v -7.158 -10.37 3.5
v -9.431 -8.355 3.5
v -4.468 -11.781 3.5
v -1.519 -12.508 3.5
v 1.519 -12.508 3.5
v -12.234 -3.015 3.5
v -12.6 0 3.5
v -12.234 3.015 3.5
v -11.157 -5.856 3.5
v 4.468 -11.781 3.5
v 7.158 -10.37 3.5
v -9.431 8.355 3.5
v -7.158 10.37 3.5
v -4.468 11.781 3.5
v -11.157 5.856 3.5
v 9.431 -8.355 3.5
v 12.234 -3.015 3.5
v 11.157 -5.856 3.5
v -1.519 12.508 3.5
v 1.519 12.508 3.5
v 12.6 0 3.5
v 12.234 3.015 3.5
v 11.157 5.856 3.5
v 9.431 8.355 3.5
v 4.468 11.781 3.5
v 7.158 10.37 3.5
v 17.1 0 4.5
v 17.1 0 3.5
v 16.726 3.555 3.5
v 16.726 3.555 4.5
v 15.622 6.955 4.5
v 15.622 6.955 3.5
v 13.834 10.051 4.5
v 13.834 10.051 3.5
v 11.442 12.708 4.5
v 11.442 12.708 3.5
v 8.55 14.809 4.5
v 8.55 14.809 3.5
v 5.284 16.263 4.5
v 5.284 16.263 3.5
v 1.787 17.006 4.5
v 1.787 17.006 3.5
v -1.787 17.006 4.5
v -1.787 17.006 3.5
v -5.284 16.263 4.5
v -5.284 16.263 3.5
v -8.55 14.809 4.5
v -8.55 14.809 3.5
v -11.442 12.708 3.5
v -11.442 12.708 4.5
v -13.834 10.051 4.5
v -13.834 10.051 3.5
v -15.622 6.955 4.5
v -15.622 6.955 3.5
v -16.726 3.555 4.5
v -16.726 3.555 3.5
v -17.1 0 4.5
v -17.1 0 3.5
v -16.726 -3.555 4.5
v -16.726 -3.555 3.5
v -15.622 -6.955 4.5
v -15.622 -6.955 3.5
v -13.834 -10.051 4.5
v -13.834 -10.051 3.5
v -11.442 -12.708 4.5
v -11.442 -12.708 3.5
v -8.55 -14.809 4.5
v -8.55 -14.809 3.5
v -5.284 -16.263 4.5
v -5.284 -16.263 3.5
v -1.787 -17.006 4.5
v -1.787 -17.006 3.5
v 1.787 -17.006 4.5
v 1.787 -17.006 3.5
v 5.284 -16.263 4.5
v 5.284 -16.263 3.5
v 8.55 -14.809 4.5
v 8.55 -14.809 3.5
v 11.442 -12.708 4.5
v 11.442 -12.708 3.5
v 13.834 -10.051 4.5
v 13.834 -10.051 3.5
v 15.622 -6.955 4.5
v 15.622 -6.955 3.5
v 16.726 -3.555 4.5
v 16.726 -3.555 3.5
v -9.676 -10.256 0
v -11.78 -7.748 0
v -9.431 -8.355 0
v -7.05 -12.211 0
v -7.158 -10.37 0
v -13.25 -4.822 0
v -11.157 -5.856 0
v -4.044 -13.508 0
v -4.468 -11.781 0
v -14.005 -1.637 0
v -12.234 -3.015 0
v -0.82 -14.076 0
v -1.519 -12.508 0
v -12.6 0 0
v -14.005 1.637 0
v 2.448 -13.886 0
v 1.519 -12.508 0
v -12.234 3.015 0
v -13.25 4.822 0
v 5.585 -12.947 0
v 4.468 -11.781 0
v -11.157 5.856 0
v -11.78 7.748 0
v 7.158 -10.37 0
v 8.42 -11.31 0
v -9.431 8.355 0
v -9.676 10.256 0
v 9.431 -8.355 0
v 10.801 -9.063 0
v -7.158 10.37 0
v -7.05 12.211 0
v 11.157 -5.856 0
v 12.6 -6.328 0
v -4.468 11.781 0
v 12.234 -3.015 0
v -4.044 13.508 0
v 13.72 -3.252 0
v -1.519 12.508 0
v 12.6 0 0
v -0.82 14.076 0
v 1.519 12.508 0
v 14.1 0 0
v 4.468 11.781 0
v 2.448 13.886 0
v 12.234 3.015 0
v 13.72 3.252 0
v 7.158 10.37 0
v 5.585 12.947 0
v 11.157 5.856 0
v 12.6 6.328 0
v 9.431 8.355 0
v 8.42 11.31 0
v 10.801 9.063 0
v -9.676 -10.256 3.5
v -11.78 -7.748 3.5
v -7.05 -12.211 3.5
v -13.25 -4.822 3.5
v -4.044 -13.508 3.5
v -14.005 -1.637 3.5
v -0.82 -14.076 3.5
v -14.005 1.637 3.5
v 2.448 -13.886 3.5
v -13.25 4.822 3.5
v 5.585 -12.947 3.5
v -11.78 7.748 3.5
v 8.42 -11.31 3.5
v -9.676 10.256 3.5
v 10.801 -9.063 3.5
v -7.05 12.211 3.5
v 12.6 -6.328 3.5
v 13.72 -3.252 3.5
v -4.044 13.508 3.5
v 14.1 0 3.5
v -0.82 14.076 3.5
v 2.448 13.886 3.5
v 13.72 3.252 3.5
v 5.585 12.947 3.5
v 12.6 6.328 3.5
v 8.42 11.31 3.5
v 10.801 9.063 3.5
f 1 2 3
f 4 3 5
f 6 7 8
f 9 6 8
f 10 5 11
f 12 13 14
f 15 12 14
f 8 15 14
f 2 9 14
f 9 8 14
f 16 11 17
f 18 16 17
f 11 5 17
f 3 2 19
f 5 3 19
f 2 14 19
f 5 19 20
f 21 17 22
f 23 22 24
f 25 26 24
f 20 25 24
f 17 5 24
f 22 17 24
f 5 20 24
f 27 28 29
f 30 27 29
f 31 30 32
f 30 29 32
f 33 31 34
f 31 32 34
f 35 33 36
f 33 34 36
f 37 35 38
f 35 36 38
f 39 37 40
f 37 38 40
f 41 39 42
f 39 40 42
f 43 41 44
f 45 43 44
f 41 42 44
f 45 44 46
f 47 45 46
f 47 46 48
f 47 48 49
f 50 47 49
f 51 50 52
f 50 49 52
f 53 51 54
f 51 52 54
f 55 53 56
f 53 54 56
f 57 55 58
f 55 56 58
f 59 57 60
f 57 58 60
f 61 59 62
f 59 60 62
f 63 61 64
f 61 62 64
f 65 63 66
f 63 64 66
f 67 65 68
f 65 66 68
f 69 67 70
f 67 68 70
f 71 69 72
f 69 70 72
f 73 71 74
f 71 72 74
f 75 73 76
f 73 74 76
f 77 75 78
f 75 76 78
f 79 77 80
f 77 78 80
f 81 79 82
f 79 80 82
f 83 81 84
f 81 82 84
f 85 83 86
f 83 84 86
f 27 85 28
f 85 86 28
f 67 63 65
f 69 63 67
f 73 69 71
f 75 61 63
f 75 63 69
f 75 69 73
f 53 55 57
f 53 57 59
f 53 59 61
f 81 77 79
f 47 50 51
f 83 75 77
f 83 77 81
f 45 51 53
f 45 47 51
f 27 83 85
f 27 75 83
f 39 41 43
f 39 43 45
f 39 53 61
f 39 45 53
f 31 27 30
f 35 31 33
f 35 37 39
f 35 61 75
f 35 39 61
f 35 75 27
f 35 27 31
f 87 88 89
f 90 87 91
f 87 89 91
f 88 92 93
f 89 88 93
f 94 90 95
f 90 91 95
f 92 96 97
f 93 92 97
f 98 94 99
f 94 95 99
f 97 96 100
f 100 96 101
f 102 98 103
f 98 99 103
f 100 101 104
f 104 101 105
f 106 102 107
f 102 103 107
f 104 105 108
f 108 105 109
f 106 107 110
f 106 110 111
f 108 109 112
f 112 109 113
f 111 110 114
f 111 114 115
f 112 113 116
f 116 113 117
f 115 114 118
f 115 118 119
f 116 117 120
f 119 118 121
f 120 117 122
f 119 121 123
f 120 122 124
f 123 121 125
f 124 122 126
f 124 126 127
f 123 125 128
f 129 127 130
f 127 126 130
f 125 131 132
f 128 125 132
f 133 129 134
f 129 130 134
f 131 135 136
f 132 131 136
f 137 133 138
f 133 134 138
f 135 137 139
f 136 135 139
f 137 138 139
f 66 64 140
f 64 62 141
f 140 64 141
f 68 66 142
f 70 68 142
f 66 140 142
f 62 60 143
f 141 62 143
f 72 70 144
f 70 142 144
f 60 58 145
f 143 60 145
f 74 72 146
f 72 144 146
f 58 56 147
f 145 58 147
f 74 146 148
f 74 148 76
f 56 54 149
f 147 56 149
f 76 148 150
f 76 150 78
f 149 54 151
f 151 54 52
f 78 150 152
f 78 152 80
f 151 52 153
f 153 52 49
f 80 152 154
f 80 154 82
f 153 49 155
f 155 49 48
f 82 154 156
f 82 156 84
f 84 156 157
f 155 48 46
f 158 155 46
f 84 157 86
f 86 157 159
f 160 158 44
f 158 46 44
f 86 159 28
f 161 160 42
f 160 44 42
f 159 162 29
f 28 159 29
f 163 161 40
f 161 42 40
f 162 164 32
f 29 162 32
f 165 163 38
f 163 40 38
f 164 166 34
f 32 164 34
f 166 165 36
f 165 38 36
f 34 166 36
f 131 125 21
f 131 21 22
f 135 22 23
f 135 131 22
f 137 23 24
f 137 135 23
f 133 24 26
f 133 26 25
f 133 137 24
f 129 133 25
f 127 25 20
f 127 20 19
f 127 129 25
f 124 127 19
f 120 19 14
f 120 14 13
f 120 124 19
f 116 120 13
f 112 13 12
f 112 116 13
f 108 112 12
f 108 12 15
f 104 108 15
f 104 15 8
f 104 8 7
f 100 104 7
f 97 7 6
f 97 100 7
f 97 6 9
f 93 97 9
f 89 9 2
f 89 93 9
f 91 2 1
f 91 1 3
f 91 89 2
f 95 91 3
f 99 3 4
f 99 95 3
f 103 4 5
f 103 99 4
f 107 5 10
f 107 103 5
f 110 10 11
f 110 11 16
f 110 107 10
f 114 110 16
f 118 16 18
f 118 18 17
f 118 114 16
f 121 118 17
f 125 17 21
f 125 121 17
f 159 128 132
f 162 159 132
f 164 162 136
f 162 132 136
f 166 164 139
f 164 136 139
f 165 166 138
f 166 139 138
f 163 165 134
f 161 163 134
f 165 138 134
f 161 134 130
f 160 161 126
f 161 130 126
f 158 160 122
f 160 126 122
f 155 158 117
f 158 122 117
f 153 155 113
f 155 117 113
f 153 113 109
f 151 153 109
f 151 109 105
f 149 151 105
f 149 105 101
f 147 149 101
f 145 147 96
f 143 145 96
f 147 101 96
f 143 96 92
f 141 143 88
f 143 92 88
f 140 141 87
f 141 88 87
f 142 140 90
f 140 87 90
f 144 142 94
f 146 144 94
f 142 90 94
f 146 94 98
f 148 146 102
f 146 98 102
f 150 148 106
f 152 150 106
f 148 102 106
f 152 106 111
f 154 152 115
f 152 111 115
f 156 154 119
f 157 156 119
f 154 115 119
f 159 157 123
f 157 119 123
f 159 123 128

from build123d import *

# Parameters (mm, degrees)
SKETCH1_R           = 14.1
SKETCH1_R_2         = 12.6
BOSS_EXTRUDE1_DEPTH = 3.5
SKETCH2_R           = 17.1
SKETCH2_R_2         = 14.1
SKETCH2_R_3         = 12.6
BOSS_EXTRUDE2_DEPTH = 1


with BuildPart() as part:
    # Sketch1 → Boss-Extrude1 (new body)
    with BuildSketch(Plane.XY):
        Circle(SKETCH1_R)
        Circle(SKETCH1_R_2, mode=Mode.SUBTRACT)
    extrude(amount=BOSS_EXTRUDE1_DEPTH)

    # Sketch2 → Boss-Extrude2 (add)
    # profile 1 of 3: a face of its own
    with BuildSketch(Plane.XY.offset(3.5)):
        Circle(SKETCH2_R)
        Circle(SKETCH2_R_2, mode=Mode.SUBTRACT)
    # profile 2 of 3: a face of its own
    with BuildSketch(Plane.XY.offset(3.5)):
        Circle(SKETCH2_R_2)
        Circle(SKETCH2_R_3, mode=Mode.SUBTRACT)
    # profile 3 of 3: a face of its own
    with BuildSketch(Plane.XY.offset(3.5)):
        Circle(SKETCH2_R_3)
    extrude(amount=BOSS_EXTRUDE2_DEPTH)


solid = part.part
